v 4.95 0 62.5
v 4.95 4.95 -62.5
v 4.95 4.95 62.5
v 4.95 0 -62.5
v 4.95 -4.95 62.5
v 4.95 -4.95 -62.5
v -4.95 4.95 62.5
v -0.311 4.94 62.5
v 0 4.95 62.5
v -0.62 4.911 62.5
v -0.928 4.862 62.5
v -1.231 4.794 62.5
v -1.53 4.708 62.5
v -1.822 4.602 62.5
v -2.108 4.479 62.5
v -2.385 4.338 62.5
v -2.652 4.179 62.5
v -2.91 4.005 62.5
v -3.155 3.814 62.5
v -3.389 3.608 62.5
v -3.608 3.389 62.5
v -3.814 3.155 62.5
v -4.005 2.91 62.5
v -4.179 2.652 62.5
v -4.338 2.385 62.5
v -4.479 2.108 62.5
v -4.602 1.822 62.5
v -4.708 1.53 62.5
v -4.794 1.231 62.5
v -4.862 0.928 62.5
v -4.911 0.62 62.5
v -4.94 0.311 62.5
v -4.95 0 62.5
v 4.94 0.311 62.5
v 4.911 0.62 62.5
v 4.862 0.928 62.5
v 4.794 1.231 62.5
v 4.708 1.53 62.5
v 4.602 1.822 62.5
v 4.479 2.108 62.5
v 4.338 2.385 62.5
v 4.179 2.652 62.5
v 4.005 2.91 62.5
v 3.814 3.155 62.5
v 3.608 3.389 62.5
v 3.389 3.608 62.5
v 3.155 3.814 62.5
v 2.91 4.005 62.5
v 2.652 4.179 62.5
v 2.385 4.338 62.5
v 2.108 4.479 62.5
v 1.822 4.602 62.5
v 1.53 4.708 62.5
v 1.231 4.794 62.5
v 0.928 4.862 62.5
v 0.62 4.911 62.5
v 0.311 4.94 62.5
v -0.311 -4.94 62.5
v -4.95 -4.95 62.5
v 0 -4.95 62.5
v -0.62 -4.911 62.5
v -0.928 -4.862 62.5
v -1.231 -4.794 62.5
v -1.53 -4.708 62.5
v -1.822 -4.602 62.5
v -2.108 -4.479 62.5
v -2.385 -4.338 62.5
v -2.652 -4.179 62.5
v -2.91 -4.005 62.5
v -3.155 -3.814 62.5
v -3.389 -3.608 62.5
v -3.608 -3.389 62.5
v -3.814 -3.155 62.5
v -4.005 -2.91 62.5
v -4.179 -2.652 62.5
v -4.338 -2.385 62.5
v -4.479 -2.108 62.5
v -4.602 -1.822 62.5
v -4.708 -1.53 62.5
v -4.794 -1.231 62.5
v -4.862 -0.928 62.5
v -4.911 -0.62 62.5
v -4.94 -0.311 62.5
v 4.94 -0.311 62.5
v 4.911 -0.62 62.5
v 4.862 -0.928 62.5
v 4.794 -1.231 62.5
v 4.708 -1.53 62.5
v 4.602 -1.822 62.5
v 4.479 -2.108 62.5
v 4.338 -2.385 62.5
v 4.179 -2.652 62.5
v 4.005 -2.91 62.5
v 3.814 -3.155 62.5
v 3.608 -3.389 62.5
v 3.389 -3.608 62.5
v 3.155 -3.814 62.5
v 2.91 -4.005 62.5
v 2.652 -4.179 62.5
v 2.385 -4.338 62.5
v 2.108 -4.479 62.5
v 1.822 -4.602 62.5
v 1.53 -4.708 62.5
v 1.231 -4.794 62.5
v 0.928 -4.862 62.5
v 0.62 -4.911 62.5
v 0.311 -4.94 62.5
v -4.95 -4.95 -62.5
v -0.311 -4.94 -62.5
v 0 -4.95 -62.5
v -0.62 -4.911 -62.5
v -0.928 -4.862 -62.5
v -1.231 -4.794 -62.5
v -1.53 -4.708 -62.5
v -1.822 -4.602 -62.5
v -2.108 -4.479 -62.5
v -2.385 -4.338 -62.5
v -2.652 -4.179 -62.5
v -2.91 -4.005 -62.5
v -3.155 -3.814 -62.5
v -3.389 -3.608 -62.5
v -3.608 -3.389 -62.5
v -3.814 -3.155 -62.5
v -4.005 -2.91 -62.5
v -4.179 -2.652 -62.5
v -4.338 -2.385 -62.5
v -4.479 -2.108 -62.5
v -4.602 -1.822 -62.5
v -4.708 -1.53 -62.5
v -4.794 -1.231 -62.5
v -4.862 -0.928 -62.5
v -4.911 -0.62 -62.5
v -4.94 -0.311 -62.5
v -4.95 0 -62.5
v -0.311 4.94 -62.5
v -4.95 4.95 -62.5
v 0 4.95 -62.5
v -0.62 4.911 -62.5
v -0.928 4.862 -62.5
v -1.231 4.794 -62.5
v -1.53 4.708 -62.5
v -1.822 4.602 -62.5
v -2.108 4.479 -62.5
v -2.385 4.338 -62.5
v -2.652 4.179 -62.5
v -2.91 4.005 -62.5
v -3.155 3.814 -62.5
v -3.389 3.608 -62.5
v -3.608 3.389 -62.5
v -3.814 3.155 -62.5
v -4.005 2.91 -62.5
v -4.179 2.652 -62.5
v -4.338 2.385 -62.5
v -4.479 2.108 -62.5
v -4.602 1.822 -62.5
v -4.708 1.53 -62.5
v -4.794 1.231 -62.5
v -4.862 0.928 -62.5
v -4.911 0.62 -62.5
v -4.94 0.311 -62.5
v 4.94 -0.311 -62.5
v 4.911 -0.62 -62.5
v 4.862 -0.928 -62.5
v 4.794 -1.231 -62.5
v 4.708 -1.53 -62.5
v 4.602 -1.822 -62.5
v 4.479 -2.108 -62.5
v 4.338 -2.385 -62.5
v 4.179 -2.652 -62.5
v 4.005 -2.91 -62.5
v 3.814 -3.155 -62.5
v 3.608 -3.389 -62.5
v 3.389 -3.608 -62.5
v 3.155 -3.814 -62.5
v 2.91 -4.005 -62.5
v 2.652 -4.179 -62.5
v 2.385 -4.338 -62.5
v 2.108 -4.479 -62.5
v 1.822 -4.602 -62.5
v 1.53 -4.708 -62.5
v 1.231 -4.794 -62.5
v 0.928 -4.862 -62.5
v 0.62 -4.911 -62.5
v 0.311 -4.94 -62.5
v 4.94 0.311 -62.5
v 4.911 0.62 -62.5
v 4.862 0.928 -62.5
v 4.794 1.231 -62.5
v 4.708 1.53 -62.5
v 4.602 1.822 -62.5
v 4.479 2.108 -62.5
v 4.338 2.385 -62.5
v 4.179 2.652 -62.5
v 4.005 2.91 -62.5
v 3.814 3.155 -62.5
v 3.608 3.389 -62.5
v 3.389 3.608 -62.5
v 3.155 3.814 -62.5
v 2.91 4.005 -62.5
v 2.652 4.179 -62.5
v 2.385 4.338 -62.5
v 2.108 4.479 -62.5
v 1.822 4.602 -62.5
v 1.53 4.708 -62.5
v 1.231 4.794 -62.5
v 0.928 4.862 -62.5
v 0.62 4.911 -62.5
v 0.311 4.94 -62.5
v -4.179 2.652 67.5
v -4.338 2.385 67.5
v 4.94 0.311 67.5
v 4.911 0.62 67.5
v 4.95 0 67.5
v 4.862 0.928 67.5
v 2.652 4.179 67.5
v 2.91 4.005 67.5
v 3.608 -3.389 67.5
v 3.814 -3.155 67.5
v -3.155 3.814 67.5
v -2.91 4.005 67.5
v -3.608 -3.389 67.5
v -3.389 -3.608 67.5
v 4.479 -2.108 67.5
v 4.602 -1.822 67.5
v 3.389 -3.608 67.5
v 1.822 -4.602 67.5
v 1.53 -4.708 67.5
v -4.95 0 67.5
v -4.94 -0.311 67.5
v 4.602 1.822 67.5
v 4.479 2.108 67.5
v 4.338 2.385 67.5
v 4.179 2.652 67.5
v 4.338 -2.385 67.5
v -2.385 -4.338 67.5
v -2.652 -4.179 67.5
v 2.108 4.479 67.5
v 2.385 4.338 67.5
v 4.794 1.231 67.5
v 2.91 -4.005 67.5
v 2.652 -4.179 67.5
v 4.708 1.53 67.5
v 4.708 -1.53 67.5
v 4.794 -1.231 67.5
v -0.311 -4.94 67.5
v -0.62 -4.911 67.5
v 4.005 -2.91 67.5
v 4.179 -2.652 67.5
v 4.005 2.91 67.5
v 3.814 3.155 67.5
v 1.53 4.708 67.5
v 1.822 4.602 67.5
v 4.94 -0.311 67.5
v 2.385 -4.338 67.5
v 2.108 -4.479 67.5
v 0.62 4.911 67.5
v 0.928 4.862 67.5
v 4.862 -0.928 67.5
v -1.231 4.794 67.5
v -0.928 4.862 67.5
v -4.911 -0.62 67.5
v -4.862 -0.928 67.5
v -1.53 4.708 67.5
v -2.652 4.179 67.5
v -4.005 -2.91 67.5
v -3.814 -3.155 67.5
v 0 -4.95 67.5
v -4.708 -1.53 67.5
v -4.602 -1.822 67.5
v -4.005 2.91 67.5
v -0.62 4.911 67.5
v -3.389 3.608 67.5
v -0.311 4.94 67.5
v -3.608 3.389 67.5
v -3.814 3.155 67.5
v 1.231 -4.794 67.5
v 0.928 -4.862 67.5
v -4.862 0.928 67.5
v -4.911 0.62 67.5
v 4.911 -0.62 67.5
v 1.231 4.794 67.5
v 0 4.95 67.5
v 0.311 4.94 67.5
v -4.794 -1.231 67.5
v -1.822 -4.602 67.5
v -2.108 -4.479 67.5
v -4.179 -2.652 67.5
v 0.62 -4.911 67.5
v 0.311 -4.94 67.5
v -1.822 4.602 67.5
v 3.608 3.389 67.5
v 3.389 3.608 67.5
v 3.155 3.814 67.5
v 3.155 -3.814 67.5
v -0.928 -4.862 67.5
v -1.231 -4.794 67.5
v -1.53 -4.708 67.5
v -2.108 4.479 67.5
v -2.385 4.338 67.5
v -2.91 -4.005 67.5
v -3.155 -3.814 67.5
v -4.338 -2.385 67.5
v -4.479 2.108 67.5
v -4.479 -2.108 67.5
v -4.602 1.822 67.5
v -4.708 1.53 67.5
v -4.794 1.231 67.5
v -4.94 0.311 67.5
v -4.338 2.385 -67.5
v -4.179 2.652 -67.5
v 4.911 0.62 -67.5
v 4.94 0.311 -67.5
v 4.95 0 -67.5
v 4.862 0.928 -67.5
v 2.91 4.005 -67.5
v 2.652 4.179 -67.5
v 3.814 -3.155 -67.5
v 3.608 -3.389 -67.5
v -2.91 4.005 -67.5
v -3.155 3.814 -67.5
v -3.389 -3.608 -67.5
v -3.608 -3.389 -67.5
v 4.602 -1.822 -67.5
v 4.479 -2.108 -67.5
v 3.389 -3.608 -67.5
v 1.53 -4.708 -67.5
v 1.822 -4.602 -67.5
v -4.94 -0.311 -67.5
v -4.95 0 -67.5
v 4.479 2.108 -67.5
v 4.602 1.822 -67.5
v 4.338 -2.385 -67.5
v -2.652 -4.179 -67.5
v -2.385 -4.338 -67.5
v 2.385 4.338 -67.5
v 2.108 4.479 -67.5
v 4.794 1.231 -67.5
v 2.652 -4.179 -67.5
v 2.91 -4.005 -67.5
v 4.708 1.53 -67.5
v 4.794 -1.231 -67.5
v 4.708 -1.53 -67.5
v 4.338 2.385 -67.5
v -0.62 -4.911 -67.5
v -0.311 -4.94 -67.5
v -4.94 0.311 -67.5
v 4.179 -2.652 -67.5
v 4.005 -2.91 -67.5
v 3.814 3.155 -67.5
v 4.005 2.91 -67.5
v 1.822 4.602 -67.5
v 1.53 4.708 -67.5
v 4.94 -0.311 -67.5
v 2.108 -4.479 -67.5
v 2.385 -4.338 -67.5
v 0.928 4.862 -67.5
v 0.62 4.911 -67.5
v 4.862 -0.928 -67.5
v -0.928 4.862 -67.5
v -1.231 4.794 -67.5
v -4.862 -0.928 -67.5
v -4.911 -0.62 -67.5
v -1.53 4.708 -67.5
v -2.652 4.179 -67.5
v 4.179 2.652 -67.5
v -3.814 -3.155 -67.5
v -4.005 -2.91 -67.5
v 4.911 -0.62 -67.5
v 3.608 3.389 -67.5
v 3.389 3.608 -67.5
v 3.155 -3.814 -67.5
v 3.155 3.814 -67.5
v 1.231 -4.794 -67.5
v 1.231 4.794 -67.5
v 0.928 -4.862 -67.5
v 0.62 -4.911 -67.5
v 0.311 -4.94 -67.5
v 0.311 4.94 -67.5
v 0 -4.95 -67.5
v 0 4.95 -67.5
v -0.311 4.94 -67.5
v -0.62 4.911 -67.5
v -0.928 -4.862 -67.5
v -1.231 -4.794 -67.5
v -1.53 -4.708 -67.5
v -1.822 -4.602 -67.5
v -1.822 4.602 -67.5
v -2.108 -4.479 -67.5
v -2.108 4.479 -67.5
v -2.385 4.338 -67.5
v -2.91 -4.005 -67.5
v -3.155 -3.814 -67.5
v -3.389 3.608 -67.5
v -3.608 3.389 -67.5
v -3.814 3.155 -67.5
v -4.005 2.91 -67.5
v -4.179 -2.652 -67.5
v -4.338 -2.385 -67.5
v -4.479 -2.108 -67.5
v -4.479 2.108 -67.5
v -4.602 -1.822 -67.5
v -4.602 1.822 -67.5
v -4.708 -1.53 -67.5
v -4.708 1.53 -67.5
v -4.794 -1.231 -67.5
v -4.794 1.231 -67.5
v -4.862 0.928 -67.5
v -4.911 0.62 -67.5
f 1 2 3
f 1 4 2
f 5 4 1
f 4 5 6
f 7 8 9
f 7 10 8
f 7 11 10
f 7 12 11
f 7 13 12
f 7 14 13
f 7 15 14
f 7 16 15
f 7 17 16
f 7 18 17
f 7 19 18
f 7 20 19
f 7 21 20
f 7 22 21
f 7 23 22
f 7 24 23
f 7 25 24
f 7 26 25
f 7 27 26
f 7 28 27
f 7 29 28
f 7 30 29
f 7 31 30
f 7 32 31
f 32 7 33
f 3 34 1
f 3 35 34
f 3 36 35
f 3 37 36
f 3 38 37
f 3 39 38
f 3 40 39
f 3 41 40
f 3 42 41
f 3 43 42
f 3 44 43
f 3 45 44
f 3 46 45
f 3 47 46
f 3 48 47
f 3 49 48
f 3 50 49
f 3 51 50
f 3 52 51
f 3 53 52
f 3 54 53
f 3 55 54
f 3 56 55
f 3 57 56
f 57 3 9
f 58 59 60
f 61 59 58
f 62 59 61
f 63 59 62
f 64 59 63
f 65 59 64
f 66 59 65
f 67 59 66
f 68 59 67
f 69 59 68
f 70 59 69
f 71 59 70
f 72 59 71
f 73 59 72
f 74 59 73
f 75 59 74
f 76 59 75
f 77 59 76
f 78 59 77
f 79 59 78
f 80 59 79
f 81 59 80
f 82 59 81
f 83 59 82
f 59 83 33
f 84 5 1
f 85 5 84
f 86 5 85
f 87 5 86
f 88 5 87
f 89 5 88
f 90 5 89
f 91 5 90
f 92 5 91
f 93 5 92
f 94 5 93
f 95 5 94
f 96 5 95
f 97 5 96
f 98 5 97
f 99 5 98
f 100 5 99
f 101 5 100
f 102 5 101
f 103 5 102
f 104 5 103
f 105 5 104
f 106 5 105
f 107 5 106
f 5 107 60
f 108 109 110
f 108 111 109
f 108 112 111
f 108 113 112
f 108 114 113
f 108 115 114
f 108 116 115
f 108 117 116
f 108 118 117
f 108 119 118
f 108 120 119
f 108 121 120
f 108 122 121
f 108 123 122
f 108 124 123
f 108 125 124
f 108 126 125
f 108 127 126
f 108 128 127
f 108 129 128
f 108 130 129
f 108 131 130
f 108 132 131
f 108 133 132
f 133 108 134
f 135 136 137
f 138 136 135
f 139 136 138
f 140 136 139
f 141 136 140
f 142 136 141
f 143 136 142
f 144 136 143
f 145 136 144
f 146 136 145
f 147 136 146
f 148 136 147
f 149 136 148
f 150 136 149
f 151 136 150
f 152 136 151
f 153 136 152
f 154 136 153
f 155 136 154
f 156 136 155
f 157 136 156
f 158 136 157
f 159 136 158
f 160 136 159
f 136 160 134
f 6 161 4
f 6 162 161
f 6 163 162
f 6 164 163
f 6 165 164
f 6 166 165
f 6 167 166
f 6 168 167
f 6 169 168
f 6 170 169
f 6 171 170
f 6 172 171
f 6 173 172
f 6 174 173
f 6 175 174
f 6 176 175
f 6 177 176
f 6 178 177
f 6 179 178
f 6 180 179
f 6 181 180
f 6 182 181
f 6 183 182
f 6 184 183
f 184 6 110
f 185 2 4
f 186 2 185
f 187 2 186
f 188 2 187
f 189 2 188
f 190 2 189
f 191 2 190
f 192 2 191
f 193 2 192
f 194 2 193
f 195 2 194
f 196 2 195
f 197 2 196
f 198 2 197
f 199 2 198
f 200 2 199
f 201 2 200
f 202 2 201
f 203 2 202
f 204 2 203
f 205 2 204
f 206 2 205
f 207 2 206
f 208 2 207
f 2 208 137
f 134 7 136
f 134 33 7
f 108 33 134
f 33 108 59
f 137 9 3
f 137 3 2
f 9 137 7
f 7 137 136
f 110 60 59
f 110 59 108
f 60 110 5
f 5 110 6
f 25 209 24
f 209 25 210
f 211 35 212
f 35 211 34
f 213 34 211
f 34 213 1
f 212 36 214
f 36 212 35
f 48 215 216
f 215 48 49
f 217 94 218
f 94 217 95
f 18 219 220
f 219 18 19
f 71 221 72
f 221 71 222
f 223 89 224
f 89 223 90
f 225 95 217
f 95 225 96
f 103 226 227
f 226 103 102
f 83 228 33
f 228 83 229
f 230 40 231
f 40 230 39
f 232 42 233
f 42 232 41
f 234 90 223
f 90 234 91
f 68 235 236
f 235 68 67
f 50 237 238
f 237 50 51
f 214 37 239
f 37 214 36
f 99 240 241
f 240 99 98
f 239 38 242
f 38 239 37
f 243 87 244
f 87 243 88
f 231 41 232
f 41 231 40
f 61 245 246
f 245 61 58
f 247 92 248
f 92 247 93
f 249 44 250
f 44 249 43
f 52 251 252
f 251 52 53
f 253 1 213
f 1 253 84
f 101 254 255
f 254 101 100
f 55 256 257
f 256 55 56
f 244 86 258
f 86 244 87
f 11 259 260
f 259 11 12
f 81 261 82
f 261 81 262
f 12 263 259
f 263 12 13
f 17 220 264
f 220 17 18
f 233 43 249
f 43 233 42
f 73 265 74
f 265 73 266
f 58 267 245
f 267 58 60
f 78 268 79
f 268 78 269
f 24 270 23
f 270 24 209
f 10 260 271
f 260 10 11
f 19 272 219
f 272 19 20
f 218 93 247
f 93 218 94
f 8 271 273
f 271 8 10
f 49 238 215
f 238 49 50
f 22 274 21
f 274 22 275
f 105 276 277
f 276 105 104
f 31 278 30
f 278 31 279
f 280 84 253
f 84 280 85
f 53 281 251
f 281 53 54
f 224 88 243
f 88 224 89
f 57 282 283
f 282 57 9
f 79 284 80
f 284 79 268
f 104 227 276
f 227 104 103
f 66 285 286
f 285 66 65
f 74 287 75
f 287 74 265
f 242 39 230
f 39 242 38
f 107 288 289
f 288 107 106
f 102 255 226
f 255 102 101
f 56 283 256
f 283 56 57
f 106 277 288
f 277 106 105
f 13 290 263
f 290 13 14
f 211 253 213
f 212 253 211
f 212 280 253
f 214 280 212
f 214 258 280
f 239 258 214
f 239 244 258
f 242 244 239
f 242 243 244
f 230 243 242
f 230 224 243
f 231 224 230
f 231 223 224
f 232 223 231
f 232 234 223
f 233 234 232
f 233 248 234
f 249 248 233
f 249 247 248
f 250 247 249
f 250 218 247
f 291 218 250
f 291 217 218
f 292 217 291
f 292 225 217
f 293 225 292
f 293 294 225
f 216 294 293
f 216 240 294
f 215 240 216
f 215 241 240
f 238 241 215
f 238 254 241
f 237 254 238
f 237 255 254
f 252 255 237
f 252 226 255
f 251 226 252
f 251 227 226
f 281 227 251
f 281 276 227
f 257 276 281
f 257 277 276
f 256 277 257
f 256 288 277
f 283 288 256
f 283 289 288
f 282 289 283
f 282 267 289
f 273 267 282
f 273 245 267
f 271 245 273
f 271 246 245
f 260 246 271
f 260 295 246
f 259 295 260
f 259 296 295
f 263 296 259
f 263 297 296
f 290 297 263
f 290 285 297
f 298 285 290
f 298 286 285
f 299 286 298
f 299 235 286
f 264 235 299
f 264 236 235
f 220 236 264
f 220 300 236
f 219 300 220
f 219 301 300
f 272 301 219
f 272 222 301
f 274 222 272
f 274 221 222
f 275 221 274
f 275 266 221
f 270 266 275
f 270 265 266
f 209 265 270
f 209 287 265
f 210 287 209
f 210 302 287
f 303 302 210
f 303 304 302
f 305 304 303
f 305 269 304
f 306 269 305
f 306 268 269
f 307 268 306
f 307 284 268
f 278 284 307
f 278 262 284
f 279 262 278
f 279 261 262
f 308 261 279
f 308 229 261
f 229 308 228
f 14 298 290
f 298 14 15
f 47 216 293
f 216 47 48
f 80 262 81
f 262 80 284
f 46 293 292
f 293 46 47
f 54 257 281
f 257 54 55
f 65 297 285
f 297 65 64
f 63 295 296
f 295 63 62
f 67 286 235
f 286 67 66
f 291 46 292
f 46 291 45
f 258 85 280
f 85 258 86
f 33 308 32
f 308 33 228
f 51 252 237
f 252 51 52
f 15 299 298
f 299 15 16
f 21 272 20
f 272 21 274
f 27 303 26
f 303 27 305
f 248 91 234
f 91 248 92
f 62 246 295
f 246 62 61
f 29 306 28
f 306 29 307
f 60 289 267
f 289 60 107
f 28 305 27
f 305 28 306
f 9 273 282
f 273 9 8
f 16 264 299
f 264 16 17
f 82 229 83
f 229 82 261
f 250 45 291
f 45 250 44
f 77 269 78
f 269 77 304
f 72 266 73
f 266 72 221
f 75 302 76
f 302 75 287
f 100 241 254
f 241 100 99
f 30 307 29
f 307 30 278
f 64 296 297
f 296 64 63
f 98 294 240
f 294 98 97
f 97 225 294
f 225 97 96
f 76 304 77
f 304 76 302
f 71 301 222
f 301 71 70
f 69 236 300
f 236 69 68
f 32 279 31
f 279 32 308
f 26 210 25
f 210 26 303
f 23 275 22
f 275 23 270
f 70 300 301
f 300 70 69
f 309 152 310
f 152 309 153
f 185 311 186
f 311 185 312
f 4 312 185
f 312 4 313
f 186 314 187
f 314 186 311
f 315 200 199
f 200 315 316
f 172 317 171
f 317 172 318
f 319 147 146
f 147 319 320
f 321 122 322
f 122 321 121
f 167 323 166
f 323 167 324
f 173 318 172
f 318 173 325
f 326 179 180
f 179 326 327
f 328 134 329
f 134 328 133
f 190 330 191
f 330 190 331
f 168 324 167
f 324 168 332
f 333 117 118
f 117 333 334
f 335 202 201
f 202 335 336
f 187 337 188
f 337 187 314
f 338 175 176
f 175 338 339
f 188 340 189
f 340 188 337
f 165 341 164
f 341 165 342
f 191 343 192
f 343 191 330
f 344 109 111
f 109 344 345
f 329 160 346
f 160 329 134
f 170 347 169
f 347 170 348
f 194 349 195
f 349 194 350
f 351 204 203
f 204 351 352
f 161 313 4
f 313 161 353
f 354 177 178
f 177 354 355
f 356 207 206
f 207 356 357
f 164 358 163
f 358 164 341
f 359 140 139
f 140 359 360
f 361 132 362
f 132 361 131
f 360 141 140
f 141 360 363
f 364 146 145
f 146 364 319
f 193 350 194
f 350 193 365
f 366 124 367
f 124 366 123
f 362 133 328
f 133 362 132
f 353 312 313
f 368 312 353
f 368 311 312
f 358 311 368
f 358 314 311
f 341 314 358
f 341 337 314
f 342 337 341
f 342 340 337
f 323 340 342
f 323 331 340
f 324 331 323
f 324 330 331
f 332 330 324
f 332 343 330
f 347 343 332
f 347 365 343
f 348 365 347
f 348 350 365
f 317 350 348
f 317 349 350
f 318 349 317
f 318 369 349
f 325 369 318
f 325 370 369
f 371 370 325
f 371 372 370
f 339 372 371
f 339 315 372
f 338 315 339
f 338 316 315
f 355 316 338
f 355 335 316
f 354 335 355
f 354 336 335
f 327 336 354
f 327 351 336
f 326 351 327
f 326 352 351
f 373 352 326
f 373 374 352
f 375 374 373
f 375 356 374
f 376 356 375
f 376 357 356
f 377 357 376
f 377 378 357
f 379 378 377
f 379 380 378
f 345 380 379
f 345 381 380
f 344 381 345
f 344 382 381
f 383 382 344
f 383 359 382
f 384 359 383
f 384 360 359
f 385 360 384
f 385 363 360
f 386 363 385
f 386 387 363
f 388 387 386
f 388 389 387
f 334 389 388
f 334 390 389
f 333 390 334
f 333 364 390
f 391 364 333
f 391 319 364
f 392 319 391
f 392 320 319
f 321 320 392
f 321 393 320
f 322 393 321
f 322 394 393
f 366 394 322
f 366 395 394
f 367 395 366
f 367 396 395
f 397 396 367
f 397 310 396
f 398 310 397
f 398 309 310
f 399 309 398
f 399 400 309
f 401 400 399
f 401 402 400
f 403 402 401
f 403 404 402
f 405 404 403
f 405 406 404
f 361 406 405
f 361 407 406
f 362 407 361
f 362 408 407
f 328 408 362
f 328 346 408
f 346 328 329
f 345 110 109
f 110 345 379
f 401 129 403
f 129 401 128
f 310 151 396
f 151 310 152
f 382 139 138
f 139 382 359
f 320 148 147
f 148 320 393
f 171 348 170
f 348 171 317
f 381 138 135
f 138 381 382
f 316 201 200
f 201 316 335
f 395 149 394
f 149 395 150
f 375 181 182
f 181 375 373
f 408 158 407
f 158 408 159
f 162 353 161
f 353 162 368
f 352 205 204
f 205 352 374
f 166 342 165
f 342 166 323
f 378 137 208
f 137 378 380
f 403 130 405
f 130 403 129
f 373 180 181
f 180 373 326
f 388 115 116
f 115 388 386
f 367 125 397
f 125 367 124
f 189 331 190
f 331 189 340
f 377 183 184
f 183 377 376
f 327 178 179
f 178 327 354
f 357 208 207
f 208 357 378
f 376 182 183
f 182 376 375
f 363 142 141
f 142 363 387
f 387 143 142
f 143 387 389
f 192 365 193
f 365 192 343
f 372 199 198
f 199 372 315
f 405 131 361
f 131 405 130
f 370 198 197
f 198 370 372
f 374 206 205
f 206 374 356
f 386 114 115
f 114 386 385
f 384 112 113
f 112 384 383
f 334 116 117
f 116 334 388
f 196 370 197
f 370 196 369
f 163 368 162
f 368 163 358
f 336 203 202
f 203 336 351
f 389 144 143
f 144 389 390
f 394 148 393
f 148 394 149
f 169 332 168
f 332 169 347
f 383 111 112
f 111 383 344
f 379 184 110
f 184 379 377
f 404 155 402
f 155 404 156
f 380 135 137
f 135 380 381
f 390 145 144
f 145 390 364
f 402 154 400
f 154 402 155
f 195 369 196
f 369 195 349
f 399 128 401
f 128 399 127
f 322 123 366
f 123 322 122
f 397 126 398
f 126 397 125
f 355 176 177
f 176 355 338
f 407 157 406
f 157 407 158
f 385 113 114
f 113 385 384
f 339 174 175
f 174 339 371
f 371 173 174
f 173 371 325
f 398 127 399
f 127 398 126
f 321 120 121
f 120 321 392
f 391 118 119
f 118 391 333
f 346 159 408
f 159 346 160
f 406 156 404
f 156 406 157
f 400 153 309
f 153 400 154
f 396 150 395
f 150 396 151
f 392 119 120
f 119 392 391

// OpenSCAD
include <./modules.scad>;

// axe du premier barillet pour la partie sonnerie

cube([2*ep_axe-jeu_axe,2*ep_axe-jeu_axe,l*echelle],center=true);
translate([0,0,(l*echelle/2)+ep_cadre*echelle/2])  cylinder(r=ep_axe-jeu_axe/2,h=ep_cadre*echelle,$fn=100,center=true);
translate([0,0,-(l*echelle/2)-ep_cadre*echelle/2])  cylinder(r=ep_axe-jeu_axe/2,h=ep_cadre*echelle,$fn=100,center=true);
